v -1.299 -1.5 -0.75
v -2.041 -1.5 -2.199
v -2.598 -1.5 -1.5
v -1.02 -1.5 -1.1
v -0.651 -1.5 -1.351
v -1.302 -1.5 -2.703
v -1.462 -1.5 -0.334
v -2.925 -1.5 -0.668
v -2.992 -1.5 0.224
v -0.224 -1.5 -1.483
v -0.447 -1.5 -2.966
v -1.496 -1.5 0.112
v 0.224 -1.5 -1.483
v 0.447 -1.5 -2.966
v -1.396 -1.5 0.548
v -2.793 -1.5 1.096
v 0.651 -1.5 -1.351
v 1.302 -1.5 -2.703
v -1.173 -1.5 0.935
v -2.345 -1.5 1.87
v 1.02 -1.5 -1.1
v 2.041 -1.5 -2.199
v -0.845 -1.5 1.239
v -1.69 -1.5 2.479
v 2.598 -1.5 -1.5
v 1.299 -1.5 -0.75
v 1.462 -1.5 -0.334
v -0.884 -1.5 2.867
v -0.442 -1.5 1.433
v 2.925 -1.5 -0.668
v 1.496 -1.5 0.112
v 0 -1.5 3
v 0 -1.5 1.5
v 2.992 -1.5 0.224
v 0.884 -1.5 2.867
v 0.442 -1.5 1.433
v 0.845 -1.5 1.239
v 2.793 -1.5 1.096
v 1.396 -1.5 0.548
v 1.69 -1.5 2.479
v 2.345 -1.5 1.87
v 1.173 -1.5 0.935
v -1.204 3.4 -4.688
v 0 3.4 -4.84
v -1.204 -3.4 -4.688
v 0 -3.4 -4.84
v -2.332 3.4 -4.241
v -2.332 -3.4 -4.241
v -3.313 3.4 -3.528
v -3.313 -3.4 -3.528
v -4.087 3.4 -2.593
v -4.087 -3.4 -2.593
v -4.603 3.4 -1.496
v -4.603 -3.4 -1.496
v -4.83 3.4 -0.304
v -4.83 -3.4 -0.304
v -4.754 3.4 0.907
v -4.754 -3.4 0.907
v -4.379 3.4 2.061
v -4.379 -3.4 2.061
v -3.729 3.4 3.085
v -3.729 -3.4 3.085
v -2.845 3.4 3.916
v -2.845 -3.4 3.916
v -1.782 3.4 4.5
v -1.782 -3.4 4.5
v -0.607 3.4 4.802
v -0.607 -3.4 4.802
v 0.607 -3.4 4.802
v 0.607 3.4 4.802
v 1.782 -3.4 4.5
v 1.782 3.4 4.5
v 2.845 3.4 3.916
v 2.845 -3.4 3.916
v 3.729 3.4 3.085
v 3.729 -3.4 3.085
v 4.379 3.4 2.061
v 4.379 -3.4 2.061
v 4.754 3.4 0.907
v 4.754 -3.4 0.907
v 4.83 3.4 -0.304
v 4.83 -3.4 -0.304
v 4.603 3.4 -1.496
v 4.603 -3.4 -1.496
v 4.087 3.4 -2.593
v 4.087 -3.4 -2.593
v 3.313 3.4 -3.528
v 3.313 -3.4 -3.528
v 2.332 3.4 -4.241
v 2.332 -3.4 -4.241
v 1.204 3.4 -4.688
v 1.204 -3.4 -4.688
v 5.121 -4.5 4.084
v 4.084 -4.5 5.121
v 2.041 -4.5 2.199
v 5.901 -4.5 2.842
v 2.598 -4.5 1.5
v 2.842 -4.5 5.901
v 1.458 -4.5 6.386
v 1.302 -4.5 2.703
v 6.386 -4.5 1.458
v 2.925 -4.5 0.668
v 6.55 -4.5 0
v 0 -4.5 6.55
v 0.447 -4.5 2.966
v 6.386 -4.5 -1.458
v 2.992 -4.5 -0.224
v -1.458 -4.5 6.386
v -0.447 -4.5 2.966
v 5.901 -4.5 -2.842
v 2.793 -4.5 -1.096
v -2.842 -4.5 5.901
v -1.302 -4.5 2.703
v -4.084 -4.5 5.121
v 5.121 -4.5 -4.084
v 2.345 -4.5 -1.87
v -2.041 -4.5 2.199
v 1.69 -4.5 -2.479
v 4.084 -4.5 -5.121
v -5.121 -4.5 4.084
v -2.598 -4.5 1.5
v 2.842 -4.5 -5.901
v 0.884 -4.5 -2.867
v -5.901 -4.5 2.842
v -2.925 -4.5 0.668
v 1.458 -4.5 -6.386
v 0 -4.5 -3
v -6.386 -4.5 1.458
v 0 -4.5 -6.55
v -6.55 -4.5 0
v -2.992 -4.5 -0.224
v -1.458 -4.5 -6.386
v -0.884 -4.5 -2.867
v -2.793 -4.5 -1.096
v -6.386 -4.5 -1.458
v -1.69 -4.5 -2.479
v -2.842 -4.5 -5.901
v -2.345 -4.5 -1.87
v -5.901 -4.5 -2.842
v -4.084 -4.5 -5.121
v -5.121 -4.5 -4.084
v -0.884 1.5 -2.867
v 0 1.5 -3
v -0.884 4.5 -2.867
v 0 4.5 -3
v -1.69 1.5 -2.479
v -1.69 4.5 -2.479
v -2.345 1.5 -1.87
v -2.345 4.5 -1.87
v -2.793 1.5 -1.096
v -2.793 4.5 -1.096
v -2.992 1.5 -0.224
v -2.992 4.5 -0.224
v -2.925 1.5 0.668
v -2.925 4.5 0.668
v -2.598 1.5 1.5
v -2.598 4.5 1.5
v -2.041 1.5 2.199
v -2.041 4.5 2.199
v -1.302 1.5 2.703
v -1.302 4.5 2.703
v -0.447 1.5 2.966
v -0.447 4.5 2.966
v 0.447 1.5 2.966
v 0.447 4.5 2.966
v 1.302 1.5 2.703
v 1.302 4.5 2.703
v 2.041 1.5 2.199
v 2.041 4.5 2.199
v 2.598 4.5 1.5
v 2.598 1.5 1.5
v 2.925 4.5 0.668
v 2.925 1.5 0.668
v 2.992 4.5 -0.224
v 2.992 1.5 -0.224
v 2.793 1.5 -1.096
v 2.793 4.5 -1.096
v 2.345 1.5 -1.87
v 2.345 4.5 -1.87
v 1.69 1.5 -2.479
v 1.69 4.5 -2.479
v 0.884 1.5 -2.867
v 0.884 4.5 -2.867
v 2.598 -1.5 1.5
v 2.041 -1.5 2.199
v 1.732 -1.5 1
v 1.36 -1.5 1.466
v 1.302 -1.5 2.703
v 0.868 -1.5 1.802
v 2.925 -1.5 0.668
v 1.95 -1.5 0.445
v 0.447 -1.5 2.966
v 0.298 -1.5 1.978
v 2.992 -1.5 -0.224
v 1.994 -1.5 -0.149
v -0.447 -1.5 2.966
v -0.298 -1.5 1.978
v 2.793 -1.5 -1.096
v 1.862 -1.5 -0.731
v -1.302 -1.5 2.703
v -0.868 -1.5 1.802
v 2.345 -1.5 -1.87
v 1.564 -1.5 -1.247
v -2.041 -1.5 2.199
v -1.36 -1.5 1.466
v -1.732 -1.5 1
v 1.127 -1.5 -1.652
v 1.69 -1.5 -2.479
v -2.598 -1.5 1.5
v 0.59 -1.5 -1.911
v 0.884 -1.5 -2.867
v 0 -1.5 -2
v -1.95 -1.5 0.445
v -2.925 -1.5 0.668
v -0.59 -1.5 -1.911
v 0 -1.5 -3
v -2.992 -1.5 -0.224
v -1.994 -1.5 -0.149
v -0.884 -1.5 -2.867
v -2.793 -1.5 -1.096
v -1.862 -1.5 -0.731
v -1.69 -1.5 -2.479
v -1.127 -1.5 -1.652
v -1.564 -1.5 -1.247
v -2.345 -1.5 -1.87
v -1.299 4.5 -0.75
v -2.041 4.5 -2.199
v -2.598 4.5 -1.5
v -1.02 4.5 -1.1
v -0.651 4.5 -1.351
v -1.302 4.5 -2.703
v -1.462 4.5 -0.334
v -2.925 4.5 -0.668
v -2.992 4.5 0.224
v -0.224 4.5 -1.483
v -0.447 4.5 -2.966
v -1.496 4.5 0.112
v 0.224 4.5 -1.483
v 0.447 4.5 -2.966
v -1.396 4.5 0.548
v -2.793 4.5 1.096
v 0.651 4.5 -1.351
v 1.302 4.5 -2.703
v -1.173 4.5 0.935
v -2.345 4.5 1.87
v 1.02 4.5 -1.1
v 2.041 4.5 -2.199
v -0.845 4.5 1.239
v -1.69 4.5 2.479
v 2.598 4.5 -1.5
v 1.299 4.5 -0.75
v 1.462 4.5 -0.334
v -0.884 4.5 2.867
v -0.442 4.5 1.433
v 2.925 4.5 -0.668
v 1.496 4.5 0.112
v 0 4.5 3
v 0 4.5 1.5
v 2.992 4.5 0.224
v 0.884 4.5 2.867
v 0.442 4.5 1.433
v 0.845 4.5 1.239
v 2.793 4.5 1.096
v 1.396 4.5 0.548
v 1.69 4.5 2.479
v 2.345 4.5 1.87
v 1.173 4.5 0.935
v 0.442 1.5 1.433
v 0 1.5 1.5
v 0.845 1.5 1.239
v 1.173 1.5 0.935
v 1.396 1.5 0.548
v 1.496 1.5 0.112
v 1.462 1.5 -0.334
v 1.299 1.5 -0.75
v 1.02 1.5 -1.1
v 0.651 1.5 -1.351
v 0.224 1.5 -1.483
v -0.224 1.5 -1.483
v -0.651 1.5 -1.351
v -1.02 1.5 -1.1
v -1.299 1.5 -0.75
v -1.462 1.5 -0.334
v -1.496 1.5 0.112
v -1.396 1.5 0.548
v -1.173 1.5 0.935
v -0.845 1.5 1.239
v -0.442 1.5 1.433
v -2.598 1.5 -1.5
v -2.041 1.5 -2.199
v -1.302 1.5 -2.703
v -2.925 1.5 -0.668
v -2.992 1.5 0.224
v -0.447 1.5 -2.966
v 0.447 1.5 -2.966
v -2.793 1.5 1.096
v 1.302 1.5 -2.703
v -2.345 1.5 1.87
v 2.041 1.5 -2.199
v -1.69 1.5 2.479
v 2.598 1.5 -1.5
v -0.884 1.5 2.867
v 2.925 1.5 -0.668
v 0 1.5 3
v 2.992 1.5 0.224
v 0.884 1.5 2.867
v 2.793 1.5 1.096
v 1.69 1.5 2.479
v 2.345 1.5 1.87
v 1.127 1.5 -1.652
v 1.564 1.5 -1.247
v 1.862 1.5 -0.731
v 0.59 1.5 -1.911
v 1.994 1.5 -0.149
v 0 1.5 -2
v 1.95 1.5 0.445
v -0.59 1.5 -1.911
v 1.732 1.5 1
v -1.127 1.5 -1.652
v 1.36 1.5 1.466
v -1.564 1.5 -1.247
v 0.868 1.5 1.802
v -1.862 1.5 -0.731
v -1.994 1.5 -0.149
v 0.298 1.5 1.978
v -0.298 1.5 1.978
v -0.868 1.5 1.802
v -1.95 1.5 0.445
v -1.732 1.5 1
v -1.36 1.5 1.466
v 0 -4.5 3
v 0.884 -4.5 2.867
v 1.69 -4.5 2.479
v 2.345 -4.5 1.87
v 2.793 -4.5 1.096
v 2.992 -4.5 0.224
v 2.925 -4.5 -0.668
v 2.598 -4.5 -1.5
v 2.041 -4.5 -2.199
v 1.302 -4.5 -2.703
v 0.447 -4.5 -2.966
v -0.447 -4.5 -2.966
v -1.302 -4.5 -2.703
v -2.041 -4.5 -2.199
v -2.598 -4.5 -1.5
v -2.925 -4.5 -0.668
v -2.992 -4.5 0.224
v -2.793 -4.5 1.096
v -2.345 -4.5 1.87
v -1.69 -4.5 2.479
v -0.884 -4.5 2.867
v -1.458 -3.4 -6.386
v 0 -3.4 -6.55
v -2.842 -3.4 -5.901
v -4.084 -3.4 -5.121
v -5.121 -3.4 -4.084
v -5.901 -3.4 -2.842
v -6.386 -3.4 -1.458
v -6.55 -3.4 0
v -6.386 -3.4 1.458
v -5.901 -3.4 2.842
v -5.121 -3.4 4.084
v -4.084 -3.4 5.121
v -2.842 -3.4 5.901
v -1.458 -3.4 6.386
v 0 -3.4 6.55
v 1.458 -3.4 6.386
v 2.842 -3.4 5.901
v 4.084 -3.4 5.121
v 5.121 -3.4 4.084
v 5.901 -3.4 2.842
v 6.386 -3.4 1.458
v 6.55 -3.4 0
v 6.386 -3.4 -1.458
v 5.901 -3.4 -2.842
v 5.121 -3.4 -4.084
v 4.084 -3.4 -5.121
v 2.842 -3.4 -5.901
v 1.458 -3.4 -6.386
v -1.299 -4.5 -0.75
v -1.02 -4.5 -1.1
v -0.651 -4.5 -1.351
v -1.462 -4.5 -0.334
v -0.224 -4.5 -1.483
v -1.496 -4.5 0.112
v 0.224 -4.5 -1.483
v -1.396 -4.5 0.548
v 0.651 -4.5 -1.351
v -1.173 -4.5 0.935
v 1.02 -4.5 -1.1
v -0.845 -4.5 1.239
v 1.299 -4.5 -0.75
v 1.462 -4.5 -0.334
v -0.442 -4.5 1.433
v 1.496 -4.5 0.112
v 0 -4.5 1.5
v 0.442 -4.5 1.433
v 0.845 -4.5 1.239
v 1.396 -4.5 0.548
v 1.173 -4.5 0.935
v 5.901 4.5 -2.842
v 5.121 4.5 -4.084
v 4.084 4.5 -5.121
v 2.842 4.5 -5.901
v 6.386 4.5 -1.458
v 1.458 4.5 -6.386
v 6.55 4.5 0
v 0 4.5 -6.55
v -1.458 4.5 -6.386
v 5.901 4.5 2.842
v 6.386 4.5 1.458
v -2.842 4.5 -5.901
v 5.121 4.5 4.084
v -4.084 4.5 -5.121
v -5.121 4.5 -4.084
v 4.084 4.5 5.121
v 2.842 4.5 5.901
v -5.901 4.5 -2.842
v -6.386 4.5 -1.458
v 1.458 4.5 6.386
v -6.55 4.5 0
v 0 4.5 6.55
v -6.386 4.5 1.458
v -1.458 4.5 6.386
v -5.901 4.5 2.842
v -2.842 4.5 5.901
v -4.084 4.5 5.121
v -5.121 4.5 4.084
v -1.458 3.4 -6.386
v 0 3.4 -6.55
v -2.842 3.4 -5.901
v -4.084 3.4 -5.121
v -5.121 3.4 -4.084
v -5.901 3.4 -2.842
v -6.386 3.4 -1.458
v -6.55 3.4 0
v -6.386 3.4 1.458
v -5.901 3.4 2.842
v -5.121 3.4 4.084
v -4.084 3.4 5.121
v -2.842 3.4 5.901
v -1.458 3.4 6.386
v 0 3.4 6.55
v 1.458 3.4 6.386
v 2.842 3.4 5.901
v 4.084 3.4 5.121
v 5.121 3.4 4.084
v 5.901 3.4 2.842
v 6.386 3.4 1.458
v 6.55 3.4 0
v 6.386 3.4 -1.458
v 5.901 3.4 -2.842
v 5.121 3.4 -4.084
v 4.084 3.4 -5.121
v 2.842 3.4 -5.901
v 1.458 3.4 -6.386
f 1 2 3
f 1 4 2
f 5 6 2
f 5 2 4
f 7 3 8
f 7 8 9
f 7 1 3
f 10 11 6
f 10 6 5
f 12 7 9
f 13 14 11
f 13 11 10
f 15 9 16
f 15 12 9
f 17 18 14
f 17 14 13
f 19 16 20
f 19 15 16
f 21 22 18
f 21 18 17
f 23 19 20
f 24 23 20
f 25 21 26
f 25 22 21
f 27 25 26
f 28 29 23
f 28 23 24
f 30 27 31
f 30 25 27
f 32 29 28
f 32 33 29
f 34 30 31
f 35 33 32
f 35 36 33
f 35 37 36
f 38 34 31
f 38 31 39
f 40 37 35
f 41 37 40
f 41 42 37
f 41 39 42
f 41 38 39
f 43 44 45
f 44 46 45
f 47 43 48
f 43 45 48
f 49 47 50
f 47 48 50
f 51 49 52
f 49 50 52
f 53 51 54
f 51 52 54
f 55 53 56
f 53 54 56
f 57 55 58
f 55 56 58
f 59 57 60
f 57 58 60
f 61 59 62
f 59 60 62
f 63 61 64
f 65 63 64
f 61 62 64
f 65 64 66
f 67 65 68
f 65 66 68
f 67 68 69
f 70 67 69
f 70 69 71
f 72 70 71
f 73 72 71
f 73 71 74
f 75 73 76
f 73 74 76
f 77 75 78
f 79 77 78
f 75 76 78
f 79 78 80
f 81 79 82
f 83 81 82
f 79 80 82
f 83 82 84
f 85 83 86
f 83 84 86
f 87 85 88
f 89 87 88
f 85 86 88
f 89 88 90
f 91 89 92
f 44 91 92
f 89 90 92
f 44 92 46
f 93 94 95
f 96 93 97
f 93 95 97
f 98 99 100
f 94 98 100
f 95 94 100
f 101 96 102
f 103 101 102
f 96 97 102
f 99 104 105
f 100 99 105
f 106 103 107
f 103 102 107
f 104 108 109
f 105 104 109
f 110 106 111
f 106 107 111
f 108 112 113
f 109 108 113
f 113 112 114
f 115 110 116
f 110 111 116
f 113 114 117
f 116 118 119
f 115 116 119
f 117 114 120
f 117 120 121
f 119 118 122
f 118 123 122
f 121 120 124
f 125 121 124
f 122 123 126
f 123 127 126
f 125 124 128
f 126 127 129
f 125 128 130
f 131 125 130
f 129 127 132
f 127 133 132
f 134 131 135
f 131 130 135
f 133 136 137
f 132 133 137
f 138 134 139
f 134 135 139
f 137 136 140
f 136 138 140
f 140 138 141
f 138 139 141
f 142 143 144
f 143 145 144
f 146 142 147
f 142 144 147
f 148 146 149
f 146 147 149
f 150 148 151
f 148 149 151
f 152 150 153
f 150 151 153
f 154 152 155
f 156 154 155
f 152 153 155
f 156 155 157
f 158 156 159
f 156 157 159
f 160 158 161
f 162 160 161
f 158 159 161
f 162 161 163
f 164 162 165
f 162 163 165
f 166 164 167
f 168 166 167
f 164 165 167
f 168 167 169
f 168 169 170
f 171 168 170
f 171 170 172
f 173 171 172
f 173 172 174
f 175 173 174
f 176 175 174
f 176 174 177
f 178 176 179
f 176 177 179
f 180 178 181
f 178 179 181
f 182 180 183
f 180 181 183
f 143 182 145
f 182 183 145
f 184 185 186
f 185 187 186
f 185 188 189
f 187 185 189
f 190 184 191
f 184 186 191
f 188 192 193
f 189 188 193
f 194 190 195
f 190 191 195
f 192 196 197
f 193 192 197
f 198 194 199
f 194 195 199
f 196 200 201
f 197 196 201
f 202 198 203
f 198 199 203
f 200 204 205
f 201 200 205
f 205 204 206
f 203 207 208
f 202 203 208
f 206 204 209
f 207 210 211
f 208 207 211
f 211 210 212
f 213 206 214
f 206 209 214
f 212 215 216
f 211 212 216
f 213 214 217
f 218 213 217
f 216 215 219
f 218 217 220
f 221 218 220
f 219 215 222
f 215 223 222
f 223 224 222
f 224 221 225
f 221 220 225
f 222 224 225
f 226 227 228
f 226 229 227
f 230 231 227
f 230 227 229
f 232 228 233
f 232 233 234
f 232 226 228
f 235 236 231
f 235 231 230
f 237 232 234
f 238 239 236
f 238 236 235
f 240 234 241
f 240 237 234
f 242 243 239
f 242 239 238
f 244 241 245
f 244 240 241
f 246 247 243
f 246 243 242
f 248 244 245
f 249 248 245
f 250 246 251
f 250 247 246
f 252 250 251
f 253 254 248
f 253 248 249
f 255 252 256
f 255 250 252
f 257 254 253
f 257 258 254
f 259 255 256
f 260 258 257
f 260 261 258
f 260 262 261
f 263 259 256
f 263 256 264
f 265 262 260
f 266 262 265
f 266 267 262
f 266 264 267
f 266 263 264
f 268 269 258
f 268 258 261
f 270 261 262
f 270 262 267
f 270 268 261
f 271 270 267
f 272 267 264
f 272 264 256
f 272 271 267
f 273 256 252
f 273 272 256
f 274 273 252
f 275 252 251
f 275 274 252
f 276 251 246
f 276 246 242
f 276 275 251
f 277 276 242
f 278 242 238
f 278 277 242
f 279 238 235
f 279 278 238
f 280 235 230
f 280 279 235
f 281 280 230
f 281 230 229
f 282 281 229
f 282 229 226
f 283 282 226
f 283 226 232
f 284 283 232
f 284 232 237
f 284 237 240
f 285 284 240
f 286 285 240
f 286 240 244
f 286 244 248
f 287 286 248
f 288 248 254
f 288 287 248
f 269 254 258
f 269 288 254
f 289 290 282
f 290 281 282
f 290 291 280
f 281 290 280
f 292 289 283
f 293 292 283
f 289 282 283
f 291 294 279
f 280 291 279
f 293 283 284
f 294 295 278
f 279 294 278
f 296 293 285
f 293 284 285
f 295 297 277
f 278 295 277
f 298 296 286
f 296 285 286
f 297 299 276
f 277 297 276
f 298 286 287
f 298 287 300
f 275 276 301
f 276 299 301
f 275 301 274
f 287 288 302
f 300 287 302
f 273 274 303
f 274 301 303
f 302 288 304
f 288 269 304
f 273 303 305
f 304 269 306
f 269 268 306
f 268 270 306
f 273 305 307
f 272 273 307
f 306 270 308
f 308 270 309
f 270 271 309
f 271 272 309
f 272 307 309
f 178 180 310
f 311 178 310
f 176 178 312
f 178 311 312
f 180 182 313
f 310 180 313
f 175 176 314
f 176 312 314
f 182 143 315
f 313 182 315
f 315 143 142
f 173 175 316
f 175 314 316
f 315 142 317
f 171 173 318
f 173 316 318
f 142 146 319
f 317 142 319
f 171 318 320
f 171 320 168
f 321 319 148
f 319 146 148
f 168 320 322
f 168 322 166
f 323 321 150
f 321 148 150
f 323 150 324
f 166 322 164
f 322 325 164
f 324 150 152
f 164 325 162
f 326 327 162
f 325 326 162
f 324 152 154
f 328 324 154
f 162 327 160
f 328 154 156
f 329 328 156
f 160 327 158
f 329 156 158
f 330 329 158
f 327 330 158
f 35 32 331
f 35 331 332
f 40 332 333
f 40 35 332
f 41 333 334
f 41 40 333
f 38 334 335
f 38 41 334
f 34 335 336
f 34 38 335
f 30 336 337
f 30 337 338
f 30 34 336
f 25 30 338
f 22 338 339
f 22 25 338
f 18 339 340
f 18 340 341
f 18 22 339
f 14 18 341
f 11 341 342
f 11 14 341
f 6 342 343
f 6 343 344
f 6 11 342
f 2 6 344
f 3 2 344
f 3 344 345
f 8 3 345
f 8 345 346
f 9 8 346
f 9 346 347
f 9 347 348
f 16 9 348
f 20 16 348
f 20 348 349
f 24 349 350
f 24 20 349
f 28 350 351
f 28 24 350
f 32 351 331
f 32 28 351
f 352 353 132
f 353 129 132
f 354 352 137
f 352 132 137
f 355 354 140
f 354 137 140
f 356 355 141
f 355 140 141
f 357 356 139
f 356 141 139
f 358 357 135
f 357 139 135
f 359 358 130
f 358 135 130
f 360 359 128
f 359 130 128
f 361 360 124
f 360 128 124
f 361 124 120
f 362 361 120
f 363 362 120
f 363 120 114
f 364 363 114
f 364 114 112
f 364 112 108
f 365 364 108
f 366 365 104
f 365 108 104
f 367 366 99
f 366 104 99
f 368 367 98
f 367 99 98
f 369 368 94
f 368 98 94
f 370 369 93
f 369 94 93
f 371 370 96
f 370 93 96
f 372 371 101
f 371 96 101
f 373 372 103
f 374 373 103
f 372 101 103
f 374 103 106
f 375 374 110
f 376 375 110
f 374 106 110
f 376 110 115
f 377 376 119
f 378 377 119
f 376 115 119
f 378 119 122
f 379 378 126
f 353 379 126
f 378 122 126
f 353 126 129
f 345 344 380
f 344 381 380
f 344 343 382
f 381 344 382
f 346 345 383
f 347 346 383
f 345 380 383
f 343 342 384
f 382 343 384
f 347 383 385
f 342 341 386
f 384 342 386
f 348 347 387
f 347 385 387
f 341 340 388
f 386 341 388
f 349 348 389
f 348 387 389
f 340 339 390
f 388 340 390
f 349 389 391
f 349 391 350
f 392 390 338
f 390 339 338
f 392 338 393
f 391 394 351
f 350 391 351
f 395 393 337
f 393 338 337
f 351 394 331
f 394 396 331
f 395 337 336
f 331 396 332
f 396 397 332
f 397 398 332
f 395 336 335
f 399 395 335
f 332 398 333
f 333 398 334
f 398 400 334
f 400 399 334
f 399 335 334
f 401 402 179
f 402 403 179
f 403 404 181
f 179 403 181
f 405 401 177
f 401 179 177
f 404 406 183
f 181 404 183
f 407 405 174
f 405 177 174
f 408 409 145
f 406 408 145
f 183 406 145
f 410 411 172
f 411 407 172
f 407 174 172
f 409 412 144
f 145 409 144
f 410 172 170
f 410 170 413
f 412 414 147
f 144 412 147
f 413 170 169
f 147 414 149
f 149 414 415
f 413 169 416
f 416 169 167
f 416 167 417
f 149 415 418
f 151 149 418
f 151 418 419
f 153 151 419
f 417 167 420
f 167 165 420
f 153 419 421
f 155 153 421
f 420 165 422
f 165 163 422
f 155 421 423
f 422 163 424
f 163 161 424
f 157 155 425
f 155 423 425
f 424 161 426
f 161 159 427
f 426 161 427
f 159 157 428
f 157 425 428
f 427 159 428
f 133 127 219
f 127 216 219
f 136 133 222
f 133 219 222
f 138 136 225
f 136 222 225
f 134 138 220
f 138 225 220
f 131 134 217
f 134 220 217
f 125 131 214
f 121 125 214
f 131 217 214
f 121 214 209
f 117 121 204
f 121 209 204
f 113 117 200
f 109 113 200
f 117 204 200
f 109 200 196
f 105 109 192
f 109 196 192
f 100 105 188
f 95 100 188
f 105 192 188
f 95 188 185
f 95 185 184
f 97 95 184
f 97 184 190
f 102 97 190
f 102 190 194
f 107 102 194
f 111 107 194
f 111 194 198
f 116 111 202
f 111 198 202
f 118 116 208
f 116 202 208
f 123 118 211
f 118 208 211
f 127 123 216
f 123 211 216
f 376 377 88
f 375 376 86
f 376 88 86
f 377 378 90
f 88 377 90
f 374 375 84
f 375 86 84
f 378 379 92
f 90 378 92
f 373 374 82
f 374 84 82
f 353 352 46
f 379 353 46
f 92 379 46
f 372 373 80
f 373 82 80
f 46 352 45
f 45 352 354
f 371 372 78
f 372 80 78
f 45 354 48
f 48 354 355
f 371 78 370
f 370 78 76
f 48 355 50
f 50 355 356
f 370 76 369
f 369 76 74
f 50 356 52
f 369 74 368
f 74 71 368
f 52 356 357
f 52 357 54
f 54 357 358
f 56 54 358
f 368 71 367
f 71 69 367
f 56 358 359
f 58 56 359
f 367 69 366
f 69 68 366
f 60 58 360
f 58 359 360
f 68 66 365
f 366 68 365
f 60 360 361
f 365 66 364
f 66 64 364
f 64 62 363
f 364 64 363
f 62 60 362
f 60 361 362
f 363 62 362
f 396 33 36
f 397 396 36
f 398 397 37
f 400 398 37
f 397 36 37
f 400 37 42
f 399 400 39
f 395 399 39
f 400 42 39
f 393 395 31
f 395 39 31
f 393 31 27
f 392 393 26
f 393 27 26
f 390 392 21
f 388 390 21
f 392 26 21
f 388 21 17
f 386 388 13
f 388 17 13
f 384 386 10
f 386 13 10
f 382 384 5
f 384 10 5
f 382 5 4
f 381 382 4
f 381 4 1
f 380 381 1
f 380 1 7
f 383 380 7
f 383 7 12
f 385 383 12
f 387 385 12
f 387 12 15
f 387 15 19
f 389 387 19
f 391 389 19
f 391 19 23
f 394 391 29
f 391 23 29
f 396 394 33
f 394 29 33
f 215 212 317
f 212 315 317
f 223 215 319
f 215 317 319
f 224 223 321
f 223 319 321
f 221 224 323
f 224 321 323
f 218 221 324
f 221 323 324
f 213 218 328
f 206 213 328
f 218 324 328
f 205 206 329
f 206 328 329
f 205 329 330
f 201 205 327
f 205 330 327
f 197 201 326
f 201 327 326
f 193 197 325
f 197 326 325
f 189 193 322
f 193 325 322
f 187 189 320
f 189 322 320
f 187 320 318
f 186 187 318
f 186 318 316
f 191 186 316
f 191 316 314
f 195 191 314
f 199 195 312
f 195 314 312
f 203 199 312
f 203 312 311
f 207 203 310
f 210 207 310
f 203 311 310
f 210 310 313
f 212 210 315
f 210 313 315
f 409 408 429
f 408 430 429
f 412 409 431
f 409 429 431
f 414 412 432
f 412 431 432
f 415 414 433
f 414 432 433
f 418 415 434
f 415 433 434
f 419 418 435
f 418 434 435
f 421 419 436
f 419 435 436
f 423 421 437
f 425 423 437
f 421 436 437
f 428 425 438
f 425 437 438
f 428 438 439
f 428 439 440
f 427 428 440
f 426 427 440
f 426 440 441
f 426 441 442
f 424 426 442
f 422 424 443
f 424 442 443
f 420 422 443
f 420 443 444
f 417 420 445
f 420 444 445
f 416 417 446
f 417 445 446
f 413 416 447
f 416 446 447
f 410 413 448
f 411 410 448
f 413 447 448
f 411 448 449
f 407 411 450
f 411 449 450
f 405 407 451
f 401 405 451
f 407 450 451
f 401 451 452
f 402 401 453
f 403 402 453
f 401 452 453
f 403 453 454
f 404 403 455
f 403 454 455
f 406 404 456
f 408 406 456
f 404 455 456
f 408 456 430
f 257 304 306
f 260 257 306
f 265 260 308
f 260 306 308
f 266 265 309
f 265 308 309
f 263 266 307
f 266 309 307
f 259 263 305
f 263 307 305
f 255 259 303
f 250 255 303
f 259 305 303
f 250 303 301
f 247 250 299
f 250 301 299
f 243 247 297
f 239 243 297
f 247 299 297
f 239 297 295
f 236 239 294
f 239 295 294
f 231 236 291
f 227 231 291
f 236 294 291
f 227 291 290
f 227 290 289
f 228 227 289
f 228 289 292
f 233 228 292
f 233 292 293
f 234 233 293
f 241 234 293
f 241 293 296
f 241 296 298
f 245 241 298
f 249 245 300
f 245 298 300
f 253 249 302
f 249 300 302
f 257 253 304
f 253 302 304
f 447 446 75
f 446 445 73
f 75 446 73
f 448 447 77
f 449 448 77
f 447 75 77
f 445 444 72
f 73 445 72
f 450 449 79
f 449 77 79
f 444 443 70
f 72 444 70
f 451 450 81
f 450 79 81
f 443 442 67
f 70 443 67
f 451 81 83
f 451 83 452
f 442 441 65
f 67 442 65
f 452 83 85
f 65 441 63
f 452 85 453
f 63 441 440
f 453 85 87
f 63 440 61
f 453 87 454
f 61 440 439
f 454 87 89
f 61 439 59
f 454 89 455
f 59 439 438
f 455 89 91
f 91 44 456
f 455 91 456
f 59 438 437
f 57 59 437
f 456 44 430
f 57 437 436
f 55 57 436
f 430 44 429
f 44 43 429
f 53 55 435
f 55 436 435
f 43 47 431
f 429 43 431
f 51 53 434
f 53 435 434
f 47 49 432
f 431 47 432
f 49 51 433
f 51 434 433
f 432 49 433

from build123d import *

# Parameters (mm, degrees)
ESQUISSE3_R        = 3
ESQUISSE3_R_2      = 1.5
BOSS_EXTRU_1_DEPTH = 3


with BuildPart() as part:
    # Esquisse2 → Révolution1 (revolve)
    with BuildSketch(Plane.XY, mode=Mode.PRIVATE) as r_volution1_sk:
        Polygon((2, 1.5), (3, 1.5), (3, 4.5), (6.55, 4.5), (6.55, 3.4), (4.84, 3.4), (4.84, -3.4), (6.55, -3.4), (6.55, -4.5), (3, -4.5), (3, -1.5), (2, -1.5), align=None)
    revolve(r_volution1_sk.sketch.rotate(Axis((0, 0, 0), (0, 1, 0)), 90), axis=Axis((0, 0, 0), (0, 1, 0)))


with BuildPart() as body_2:
    # Esquisse3 → Boss.-Extru.1 (new body)
    with BuildSketch(Plane(origin=(0, -1.5, 0), x_dir=(1, 0, 0), z_dir=(0, 1, 0))):
        with Locations(Location((0, 0, 0), (0, 0, 270))):
            Circle(ESQUISSE3_R)
        with Locations(Location((0, 0, 0), (0, 0, 270))):
            Circle(ESQUISSE3_R_2, mode=Mode.SUBTRACT)
    extrude(amount=-BOSS_EXTRU_1_DEPTH)


with BuildPart() as body_3:
    # Symétrie8: mirrored copy
    add(body_2.part.mirror(Plane.ZX))


solid = Compound([part.part, body_2.part, body_3.part])
